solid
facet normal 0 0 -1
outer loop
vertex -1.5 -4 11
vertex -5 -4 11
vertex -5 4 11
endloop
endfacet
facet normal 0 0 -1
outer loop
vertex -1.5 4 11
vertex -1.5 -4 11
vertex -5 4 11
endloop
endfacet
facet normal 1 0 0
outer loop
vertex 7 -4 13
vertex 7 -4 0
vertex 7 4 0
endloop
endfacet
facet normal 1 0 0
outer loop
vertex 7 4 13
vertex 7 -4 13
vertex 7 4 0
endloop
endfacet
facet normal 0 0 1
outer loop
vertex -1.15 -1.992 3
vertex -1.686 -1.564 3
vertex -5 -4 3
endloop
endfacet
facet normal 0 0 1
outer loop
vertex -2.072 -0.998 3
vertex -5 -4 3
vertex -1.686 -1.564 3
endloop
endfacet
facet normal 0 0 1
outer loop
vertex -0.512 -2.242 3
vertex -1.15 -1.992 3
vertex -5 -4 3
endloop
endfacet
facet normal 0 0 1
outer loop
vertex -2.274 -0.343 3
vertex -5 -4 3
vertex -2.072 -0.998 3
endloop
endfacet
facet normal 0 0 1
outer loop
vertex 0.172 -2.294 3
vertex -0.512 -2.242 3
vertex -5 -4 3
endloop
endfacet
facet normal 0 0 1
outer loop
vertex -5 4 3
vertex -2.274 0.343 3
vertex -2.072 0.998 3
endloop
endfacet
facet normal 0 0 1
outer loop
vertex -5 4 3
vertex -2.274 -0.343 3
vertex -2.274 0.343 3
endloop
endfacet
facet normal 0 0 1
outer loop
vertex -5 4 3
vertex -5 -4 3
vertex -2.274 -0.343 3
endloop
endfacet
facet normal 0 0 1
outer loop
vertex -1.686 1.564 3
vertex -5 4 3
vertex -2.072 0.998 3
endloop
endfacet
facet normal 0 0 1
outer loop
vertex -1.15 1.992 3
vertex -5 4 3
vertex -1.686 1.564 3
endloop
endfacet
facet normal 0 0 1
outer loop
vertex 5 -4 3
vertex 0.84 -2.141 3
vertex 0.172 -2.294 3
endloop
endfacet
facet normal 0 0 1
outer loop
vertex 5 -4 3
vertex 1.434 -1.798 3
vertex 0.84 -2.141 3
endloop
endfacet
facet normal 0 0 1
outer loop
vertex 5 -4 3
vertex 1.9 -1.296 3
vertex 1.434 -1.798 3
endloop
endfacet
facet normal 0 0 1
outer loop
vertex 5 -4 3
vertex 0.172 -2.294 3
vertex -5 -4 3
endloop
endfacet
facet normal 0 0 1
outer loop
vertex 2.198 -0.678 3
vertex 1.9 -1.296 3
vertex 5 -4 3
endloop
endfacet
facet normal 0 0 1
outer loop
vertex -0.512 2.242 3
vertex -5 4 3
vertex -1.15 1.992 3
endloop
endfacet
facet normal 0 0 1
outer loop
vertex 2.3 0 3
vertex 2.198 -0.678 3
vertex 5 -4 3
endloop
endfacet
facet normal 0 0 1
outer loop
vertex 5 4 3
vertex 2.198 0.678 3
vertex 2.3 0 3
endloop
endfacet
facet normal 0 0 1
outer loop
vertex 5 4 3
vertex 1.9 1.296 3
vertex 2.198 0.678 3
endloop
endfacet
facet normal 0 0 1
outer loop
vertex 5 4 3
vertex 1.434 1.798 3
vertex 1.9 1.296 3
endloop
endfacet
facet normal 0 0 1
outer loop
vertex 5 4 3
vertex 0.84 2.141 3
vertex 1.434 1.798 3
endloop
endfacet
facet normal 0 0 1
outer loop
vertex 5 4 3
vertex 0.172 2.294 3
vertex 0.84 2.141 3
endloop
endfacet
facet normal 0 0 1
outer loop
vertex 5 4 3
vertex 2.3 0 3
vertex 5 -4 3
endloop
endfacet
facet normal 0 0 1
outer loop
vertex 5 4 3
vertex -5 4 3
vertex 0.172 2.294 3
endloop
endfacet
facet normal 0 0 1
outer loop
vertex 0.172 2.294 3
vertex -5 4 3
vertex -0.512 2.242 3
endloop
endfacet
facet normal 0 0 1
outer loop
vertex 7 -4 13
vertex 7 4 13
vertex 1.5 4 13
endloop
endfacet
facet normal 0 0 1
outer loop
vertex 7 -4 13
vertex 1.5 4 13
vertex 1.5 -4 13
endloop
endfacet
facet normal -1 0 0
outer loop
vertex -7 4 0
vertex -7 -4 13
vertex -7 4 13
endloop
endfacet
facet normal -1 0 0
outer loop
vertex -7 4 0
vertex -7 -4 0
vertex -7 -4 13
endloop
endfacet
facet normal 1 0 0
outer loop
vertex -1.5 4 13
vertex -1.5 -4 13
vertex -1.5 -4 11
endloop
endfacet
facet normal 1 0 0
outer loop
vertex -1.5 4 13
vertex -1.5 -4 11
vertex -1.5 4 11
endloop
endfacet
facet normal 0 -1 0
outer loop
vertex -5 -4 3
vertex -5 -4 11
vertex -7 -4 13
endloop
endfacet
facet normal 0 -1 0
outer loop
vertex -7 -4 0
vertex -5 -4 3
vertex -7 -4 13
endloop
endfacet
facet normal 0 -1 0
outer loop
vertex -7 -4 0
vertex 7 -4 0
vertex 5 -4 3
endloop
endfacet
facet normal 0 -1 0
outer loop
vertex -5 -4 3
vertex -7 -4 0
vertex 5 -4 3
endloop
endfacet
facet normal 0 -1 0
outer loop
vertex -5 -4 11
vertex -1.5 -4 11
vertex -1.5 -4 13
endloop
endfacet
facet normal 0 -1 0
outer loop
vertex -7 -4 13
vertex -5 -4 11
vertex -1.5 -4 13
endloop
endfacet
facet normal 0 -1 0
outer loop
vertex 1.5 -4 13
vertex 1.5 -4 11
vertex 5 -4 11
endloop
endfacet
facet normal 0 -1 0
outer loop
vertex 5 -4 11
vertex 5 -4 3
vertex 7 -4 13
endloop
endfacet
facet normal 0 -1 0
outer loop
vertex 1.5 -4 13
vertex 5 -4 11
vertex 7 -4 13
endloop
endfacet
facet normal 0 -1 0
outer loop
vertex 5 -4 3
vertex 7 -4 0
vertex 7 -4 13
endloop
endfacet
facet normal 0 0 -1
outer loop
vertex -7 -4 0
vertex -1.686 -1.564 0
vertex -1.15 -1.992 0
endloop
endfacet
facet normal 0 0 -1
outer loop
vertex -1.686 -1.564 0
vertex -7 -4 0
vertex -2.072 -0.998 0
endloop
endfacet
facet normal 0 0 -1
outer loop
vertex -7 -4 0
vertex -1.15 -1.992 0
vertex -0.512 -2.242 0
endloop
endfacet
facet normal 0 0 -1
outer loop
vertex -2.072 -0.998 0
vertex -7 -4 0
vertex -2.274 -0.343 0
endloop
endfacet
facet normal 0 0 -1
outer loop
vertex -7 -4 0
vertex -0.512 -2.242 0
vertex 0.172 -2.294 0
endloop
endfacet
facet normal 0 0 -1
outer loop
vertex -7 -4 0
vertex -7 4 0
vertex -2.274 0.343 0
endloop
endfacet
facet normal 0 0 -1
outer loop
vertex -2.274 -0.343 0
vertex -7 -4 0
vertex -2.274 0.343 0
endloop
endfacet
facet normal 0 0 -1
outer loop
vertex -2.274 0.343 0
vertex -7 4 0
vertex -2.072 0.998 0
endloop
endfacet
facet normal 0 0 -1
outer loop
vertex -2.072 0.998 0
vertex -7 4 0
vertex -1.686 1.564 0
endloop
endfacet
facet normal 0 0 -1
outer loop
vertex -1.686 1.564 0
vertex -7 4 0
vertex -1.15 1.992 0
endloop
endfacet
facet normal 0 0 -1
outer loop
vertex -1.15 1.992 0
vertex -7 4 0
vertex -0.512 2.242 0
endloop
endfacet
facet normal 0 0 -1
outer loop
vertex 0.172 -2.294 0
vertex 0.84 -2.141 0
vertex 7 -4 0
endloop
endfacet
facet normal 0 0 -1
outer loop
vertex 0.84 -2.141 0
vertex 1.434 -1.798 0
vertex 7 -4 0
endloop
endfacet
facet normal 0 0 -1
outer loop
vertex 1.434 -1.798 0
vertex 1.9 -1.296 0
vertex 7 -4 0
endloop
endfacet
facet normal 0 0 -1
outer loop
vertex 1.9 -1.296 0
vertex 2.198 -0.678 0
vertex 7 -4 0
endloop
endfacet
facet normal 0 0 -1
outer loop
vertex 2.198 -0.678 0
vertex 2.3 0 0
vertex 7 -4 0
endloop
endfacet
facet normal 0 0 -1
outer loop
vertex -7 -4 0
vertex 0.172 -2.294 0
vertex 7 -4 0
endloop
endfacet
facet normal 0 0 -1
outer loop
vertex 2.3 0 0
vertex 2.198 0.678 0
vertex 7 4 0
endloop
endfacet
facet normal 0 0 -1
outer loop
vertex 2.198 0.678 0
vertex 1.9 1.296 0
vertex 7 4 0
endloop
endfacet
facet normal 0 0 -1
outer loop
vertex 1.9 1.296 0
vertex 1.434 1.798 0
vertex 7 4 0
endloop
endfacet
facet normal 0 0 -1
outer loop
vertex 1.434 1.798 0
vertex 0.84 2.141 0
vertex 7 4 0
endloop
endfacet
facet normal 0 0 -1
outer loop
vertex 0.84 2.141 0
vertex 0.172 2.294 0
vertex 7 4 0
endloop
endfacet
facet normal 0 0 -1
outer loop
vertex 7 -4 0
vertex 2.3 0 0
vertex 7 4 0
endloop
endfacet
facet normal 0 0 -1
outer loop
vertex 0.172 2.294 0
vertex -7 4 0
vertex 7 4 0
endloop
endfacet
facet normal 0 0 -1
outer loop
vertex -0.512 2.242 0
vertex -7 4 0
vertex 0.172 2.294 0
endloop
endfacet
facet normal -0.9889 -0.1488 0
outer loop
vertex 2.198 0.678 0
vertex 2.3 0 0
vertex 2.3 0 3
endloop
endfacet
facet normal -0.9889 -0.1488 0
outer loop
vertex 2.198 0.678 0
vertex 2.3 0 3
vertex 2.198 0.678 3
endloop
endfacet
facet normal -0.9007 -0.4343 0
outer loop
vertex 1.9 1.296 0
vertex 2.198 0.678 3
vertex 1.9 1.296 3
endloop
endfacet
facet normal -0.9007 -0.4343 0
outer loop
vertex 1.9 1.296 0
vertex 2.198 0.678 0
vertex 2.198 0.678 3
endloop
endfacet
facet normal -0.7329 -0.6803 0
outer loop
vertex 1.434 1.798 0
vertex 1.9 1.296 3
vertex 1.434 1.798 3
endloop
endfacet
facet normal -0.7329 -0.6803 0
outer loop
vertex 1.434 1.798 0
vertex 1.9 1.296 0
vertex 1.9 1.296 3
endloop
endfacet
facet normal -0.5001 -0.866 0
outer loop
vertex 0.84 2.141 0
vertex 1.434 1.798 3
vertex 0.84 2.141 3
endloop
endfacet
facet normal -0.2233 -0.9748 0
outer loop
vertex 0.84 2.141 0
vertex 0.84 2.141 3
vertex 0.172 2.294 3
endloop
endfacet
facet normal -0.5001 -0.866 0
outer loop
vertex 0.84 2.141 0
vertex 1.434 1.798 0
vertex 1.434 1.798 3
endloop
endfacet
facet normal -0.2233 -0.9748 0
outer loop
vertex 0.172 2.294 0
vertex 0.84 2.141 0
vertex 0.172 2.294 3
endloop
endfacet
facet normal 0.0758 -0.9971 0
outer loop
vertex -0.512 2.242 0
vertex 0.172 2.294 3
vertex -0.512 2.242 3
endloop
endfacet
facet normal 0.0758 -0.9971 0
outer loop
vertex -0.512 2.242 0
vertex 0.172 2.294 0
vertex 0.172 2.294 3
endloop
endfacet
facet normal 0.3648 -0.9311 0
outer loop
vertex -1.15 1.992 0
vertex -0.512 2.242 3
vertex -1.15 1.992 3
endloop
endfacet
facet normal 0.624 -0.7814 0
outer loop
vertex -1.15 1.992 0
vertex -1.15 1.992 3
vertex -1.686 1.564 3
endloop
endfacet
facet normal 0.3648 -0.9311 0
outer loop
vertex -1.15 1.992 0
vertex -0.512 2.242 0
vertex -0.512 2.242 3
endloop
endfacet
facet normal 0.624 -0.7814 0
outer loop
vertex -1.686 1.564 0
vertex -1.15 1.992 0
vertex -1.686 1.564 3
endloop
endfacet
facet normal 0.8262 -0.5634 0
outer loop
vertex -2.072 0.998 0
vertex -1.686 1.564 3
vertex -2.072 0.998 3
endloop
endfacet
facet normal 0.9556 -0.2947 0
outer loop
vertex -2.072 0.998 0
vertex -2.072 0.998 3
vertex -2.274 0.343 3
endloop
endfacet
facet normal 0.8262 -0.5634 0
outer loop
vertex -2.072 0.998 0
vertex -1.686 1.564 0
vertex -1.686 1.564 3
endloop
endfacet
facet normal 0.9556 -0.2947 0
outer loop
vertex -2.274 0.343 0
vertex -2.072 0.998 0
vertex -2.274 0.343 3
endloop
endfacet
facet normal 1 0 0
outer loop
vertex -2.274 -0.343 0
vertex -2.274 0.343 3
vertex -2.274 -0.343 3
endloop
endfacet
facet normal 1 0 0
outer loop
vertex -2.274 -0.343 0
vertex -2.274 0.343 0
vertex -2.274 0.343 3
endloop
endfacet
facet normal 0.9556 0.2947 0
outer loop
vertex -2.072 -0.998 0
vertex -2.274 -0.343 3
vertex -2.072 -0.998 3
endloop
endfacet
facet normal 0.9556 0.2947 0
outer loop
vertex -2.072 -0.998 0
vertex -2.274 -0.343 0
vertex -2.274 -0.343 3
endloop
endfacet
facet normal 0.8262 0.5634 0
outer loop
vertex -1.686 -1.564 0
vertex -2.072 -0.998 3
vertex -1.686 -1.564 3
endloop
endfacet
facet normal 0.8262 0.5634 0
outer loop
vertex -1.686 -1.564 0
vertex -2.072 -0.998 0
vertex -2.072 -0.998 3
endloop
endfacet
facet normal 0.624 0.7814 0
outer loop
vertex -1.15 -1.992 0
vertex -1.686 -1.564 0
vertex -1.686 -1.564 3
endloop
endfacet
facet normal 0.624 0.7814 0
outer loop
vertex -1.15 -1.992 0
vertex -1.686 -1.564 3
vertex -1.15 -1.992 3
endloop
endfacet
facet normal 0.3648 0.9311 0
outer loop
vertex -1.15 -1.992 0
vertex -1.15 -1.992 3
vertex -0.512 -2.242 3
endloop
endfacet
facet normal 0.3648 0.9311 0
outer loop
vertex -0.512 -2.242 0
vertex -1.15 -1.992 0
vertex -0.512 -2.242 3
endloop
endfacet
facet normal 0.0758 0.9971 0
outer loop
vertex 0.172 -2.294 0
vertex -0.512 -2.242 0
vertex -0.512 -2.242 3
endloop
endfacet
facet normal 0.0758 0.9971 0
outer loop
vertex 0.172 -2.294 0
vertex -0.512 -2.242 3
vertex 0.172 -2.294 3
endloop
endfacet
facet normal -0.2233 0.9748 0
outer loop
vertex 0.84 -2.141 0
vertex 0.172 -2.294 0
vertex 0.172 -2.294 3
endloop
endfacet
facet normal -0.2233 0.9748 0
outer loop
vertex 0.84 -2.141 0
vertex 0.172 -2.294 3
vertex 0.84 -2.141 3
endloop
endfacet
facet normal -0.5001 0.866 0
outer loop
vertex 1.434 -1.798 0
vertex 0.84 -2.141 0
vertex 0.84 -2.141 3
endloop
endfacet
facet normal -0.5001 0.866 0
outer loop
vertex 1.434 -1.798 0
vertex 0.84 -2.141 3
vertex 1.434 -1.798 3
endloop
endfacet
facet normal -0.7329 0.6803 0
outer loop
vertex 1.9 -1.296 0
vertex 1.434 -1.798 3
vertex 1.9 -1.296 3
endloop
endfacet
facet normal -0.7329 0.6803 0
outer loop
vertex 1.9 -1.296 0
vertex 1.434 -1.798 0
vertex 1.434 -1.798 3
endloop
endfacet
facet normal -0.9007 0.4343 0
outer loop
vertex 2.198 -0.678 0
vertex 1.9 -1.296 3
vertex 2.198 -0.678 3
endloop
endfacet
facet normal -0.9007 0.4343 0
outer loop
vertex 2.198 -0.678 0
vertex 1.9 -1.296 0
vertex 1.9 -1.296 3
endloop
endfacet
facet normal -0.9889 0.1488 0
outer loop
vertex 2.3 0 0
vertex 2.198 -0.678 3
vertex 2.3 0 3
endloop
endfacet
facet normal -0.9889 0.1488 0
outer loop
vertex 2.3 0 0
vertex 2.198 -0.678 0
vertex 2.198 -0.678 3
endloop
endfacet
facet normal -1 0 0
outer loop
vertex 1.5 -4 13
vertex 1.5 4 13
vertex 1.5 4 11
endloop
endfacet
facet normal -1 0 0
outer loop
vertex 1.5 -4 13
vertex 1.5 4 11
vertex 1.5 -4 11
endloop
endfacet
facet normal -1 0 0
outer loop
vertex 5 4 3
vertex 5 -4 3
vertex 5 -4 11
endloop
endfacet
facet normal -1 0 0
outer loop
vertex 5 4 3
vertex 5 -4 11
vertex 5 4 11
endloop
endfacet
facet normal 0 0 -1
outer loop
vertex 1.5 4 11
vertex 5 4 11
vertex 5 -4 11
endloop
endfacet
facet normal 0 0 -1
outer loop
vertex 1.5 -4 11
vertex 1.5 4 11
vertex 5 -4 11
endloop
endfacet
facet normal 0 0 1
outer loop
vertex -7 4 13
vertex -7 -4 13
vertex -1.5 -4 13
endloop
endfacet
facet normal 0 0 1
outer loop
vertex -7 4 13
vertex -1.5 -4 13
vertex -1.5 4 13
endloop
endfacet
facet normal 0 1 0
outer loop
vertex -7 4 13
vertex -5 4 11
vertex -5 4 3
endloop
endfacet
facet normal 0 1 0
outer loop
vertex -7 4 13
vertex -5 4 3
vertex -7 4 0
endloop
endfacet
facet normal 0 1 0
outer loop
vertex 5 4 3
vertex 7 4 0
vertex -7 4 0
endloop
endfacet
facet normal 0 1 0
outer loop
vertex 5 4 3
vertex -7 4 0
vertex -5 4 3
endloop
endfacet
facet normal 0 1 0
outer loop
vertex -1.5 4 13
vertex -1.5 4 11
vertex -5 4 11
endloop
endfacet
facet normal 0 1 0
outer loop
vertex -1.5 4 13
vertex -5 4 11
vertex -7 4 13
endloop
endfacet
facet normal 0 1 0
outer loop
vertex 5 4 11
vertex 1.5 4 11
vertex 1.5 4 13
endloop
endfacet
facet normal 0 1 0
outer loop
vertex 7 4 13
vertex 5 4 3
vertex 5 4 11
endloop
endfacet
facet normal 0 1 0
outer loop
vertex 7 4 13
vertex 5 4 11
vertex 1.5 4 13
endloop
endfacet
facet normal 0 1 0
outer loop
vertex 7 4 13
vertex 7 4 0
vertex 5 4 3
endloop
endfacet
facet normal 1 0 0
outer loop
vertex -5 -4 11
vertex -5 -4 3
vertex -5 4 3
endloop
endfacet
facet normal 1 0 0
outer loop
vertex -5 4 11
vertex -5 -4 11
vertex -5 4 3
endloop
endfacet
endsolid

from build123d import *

# Parameters (mm, degrees)
SKETCH_W     = 14
SKETCH_H     = 8
SKETCH_R     = 2.3
PAD_DEPTH    = 3
SKETCH001_W  = 2
SKETCH001_H  = 8
PAD001_DEPTH = 10
SKETCH003_W  = 8
SKETCH003_H  = 2
PAD003_DEPTH = 3.5
SKETCH004_W  = 8
SKETCH004_H  = 2
PAD004_DEPTH = 3.5


with BuildPart() as pad001:
    # Sketch → Pad (new body)
    with BuildSketch(Plane.XY):
        Rectangle(SKETCH_W, SKETCH_H)
        Circle(SKETCH_R, mode=Mode.SUBTRACT)
    extrude(amount=PAD_DEPTH)

    # Sketch001 → Pad001 (new body)
    with BuildSketch(Plane.XY.offset(3)):
        with Locations((-6, 0)):
            Rectangle(SKETCH001_W, SKETCH001_H)
        with Locations((6, 0)):
            Rectangle(SKETCH001_W, SKETCH001_H)
    extrude(amount=PAD001_DEPTH)


with BuildPart() as pad003:
    # Pad003 base: copy of Pad001
    add(pad001.part)

    # Sketch003 → Pad003 (new body)
    with BuildSketch(Plane(origin=(5, 0, 0), x_dir=(0, -1, 0), z_dir=(-1, 0, 0))):
        with Locations((0, 12)):
            Rectangle(SKETCH003_W, SKETCH003_H)
    extrude(amount=PAD003_DEPTH)


with BuildPart() as fusion:
    # Pad004 base: copy of Pad001
    add(pad001.part)

    # Sketch004 → Pad004 (new body)
    with BuildSketch(Plane.YZ.offset(-5)):
        with Locations((0, 12)):
            Rectangle(SKETCH004_W, SKETCH004_H)
    extrude(amount=PAD004_DEPTH)

    # Fusion: union Pad003
    add(pad003.part)


solid = fusion.part
